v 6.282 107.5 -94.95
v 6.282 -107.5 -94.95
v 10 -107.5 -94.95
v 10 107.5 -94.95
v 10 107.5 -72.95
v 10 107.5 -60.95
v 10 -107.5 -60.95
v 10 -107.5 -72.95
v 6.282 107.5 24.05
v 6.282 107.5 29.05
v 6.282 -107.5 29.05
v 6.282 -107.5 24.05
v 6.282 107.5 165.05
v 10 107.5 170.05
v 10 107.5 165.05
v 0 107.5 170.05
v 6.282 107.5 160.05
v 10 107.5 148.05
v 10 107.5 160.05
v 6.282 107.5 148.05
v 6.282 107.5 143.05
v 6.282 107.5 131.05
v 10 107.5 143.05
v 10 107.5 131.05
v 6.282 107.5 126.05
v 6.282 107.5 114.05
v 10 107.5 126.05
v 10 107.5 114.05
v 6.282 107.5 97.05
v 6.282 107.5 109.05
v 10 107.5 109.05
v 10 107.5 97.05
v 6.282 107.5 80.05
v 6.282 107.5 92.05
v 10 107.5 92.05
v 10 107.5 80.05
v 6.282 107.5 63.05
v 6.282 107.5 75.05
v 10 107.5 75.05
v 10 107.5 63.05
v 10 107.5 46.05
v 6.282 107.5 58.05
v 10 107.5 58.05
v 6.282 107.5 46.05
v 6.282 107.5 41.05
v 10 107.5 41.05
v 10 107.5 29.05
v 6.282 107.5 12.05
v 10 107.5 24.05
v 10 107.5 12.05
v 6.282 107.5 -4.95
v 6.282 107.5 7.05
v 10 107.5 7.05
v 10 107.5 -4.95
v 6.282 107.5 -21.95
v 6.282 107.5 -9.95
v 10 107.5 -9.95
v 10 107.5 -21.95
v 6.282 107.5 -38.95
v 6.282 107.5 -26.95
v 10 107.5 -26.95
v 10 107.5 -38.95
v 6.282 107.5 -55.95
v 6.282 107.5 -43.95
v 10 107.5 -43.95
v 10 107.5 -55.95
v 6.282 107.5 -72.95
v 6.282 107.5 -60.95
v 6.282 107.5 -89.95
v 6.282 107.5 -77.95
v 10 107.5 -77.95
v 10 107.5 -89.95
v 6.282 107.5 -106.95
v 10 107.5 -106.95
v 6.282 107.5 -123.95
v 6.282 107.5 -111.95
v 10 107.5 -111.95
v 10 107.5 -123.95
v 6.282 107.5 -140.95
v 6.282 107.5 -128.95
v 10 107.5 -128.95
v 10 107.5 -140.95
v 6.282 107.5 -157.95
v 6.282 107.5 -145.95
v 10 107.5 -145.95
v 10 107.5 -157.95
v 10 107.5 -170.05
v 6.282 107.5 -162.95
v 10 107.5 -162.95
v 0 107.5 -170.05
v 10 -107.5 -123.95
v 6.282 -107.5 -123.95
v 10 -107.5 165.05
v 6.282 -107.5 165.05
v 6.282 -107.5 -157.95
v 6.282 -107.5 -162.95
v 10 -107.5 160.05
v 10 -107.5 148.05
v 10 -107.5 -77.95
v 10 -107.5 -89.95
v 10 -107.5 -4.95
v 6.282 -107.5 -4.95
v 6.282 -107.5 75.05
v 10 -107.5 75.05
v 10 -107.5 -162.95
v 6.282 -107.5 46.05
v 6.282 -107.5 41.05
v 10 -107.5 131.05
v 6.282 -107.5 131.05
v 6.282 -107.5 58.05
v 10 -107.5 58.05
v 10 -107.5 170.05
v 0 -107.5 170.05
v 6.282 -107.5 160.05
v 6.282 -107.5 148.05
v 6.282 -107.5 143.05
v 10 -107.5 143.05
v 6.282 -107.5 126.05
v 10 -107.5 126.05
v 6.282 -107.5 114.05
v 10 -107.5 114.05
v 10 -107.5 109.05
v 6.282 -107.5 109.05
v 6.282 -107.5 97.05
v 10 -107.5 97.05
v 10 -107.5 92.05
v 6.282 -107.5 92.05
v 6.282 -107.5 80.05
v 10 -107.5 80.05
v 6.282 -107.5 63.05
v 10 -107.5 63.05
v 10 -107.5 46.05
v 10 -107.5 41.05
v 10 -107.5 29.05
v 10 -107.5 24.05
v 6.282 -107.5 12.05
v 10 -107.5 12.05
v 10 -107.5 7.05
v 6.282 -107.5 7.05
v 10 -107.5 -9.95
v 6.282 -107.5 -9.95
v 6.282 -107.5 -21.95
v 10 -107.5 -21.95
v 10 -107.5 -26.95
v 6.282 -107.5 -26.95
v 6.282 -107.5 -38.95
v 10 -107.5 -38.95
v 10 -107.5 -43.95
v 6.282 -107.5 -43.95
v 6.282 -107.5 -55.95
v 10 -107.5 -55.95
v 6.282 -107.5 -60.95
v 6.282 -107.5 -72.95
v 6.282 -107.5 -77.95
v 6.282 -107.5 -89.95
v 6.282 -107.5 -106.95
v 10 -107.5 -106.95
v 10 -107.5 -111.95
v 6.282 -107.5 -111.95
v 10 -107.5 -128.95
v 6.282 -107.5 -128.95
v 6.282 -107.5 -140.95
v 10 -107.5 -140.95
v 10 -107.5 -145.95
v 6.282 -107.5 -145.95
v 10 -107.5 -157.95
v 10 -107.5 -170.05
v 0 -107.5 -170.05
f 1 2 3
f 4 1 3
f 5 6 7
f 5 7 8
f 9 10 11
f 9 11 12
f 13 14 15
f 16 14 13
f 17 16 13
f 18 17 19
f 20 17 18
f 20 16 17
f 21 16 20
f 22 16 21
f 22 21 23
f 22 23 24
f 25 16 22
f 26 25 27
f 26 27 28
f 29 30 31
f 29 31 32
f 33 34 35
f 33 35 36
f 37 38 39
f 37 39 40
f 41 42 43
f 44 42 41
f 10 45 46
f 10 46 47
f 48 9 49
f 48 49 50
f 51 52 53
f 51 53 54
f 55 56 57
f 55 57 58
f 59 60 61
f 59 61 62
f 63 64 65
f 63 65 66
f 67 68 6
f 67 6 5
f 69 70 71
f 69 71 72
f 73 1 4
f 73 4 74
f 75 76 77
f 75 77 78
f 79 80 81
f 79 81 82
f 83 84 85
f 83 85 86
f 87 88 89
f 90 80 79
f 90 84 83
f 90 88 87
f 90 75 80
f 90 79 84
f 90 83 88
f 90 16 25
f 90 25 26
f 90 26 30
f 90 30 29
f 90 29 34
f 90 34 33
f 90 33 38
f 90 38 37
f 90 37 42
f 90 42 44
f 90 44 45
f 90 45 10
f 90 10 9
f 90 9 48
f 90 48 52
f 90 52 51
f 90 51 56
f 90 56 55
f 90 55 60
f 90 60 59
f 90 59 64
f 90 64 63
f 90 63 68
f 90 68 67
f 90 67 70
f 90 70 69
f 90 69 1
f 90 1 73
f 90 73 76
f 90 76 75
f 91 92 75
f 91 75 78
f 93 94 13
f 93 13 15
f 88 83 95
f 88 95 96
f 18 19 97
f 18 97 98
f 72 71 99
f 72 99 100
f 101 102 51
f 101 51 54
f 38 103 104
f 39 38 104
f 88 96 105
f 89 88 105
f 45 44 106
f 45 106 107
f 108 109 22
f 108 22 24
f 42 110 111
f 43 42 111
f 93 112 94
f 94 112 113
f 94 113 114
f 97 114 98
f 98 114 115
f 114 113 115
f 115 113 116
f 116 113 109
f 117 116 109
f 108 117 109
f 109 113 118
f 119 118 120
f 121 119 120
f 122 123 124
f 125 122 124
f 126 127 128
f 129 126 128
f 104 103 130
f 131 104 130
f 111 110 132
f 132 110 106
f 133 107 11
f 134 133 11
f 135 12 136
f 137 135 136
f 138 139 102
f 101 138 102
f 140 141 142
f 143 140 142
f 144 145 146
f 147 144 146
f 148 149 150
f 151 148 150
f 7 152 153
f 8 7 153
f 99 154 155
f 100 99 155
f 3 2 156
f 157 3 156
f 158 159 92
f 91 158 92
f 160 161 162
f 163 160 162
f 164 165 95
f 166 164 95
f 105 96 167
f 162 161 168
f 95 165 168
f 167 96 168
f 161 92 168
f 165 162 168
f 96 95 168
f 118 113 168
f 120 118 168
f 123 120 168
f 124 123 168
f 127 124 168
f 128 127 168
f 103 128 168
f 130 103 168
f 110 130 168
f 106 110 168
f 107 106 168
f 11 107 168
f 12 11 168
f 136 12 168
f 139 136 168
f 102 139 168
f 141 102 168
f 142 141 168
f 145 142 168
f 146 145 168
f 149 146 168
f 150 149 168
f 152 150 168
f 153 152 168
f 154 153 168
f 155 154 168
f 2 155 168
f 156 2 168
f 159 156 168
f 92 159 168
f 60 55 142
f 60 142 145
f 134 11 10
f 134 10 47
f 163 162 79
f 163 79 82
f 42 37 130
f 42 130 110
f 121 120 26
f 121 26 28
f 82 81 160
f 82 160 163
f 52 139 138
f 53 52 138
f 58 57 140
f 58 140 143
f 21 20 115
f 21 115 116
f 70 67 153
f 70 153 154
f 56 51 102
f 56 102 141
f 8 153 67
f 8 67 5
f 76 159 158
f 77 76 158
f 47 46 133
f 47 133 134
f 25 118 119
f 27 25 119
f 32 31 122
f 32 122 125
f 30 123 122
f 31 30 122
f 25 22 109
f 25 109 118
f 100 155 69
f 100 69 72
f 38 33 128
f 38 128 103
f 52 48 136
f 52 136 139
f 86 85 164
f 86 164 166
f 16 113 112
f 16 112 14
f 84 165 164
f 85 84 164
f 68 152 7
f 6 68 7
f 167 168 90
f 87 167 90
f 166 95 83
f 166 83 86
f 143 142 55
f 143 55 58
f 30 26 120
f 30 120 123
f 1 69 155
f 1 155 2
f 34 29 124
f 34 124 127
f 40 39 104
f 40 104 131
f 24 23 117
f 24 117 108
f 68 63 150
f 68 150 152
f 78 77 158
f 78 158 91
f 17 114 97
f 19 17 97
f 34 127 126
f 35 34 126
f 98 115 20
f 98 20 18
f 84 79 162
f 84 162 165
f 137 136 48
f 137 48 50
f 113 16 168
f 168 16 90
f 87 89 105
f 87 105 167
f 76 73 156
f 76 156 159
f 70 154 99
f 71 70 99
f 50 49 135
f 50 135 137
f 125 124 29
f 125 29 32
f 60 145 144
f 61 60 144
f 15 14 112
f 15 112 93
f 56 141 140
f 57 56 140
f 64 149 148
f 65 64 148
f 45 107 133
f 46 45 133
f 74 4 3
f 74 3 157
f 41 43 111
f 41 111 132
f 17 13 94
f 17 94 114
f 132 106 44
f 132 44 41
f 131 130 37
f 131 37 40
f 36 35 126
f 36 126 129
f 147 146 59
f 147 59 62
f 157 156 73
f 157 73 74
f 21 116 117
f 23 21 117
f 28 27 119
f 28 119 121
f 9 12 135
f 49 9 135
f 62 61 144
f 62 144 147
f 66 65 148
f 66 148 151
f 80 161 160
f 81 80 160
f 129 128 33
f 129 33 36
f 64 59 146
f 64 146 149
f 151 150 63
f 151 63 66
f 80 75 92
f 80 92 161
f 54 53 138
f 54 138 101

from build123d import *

# Parameters (mm, degrees)
SKETCH1_W           = 340.1
SKETCH1_H           = 215
BOSS_EXTRUDE1_DEPTH = 10
SKETCH2_W           = 7.43612634
SKETCH2_H           = 5
CUT_EXTRUDE1_DEPTH  = 216
LPATTERN1_COUNT     = 20
LPATTERN1_PITCH     = 17


with BuildPart() as part:
    # Sketch1 → Boss-Extrude1 (new body)
    with BuildSketch(Plane(origin=(0, 0, 0), x_dir=(0, 0, -1), z_dir=(1, 0, 0))):
        Rectangle(SKETCH1_W, SKETCH1_H)
    extrude(amount=BOSS_EXTRUDE1_DEPTH)

    # Sketch2 → Cut-Extrude1 (cut, through all)
    with BuildSketch(Plane(origin=(0, 107.5, 0), x_dir=(1, 0, 0), z_dir=(0, 1, 0))):
        with Locations((10, -162.55)):
            Rectangle(SKETCH2_W, SKETCH2_H)
    cut_extrude1 = extrude(amount=-CUT_EXTRUDE1_DEPTH, mode=Mode.SUBTRACT)

    # LPattern1: Cut-Extrude1 ×20
    with Locations(*[(0, 0, -i * LPATTERN1_PITCH) for i in range(1, LPATTERN1_COUNT)]):
        add(cut_extrude1, mode=Mode.SUBTRACT)


solid = part.part
